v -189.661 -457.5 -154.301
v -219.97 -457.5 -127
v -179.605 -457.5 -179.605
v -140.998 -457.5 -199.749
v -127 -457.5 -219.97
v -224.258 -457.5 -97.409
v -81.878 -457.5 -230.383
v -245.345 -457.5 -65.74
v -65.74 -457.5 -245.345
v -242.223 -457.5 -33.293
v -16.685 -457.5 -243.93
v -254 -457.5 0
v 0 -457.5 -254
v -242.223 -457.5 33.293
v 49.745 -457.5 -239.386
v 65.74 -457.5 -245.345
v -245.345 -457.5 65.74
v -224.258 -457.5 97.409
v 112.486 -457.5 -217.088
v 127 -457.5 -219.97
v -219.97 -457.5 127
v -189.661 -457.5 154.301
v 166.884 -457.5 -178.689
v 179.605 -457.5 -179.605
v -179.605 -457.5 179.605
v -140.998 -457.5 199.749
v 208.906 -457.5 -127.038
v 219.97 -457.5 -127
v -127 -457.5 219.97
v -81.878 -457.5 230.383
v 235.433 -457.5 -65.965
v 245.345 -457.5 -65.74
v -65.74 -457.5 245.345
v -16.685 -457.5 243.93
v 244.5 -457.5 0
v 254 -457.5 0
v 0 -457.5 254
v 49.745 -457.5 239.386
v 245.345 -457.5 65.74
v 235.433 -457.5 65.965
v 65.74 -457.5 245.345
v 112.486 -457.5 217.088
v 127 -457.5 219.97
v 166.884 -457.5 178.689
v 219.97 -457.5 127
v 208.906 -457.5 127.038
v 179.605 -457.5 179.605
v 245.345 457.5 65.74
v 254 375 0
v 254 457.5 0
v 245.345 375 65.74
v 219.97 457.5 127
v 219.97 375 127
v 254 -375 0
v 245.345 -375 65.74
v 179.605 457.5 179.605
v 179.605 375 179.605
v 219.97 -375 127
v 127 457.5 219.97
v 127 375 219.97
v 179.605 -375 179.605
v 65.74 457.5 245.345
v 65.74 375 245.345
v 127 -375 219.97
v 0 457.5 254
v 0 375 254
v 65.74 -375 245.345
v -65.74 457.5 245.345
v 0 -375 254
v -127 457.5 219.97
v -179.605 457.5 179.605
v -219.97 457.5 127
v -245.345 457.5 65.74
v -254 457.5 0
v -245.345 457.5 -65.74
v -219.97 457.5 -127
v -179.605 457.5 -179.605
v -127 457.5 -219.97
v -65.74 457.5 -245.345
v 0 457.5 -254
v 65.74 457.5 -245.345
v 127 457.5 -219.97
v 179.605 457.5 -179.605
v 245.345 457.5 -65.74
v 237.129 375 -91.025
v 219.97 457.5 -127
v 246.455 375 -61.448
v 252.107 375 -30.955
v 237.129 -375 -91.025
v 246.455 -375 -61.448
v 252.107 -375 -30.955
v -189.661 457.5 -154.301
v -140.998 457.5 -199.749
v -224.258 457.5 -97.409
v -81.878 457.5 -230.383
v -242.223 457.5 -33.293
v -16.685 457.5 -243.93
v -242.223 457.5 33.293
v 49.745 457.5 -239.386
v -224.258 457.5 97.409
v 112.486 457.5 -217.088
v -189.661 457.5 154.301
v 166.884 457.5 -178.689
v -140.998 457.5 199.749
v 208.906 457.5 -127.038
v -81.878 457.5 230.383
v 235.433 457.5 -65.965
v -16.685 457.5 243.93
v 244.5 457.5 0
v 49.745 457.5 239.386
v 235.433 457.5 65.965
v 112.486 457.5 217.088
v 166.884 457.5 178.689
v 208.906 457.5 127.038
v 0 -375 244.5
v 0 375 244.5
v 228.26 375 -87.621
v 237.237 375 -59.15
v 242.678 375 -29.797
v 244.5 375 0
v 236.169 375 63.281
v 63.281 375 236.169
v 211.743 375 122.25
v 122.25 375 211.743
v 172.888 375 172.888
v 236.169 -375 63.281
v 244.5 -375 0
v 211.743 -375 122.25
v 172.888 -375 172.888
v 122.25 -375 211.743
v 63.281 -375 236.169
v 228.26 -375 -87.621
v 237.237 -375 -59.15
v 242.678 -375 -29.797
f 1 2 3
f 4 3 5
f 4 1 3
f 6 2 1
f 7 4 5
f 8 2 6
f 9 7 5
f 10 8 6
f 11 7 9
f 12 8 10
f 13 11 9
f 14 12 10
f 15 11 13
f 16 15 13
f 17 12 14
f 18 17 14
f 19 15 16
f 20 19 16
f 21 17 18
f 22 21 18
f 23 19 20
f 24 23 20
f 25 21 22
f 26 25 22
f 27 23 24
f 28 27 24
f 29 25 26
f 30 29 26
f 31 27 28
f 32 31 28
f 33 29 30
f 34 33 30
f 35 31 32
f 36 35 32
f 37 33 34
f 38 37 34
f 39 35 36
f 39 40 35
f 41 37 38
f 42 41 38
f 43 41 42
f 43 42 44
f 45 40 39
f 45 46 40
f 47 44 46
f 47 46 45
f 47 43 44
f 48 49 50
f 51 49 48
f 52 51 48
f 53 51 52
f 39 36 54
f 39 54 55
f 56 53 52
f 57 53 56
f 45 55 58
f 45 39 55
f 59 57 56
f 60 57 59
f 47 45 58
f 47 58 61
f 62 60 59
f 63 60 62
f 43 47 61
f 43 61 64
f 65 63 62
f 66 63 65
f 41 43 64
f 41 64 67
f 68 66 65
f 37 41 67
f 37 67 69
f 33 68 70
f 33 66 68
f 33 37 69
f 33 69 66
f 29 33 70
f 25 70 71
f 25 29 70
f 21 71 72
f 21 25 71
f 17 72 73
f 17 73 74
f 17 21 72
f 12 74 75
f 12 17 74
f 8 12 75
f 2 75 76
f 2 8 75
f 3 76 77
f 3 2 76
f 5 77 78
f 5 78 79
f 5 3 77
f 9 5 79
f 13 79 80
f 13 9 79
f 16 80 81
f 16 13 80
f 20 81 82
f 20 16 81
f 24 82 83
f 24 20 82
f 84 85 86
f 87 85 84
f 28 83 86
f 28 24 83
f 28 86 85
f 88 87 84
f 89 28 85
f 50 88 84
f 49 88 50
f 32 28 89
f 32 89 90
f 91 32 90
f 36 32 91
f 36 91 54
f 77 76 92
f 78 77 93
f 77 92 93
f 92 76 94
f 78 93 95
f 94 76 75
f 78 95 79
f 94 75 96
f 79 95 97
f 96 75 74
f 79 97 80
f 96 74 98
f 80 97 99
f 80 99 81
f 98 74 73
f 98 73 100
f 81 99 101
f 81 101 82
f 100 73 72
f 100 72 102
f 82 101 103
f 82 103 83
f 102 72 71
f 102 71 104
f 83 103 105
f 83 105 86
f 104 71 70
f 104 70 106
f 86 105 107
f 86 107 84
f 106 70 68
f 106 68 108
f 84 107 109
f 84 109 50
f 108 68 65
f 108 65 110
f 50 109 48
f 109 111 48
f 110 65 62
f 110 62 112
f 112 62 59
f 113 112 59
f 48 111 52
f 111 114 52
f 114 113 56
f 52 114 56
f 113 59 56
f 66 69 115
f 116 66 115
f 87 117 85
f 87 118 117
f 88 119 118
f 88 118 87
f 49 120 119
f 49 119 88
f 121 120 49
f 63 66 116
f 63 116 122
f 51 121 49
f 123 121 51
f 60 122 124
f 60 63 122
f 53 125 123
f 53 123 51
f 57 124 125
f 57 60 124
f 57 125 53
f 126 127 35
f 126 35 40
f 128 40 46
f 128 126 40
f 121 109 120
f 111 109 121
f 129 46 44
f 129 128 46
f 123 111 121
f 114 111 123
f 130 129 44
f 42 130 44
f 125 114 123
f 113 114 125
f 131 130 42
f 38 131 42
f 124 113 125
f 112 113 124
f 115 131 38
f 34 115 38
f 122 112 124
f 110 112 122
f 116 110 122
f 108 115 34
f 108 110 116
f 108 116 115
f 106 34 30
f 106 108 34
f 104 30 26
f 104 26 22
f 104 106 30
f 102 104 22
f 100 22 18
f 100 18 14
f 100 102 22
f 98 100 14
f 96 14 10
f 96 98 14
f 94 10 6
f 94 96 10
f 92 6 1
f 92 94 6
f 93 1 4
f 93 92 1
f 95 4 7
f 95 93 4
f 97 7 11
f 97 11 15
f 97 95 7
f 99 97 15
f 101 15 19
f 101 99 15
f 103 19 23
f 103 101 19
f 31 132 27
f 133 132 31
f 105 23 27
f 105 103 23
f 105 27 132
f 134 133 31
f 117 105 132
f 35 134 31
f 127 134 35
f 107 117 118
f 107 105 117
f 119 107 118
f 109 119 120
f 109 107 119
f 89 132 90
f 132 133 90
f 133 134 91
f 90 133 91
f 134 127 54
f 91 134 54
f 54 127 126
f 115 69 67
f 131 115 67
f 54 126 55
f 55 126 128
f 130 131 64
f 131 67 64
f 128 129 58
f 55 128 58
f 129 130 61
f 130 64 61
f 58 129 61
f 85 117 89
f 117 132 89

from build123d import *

# Parameters (mm, degrees)
F0_R     = 254
F0_R_2   = 244.5
F1_DEPTH = 457.5
F3_DEPTH = 375


with BuildPart() as f1:
    # F0 (on Front) → F1 (new body, symmetric)
    with BuildSketch(Plane.XZ):
        Circle(F0_R)
        Circle(F0_R_2, mode=Mode.SUBTRACT)
    extrude(amount=F1_DEPTH, both=True)

    # F2 (on Front) → F3 (cut, symmetric)
    with BuildSketch(Plane.XZ):
        with BuildLine():
            ThreePointArc((237.1294283303, -91.0254591845), (209.32805191, 143.8671841789), (0, 254))
            Line((0, 254), (0, 244.5))
            ThreePointArc((0, 244.5), (201.4988531181, 138.4863249281), (228.2604142786, -87.6209636638))
            Line((228.2604142786, -87.6209636638), (237.1294283303, -91.0254591845))
        make_face()
        with BuildLine():
            ThreePointArc((228.2604142786, -87.6209636638), (201.4988531181, 138.4863249281), (0, 244.5))
            Line((0, 244.5), (0, 0))
            Line((0, 0), (228.2604142786, -87.6209636638))
        make_face()
    extrude(amount=F3_DEPTH, both=True, mode=Mode.SUBTRACT)


solid = f1.part
